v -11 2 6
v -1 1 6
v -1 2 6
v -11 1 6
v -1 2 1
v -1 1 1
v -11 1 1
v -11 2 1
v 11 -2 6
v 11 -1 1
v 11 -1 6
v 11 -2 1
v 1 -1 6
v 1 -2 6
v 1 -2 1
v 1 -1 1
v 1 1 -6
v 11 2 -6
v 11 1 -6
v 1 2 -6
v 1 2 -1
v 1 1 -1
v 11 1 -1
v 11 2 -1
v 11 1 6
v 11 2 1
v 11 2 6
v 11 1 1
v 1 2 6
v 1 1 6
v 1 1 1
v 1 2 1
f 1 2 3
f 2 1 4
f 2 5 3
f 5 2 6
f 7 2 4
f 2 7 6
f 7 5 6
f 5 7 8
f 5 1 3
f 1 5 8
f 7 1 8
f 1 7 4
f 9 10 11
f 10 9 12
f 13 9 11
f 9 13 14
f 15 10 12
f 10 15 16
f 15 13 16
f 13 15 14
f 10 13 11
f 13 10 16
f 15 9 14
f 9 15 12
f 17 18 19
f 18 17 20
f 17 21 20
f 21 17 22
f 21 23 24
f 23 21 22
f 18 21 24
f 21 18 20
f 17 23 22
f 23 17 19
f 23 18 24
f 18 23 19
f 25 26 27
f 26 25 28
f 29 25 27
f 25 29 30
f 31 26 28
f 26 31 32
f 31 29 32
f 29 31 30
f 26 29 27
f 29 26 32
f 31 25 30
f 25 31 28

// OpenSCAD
mirror([1,0,0]) translate([1,1,1]) cube([10,1,5]);
mirror([0,1,0]) translate([1,1,1]) cube([10,1,5]);
mirror([0,0,1]) translate([1,1,1]) cube([10,1,5]);
translate([1,1,1]) cube([10,1,5]);
